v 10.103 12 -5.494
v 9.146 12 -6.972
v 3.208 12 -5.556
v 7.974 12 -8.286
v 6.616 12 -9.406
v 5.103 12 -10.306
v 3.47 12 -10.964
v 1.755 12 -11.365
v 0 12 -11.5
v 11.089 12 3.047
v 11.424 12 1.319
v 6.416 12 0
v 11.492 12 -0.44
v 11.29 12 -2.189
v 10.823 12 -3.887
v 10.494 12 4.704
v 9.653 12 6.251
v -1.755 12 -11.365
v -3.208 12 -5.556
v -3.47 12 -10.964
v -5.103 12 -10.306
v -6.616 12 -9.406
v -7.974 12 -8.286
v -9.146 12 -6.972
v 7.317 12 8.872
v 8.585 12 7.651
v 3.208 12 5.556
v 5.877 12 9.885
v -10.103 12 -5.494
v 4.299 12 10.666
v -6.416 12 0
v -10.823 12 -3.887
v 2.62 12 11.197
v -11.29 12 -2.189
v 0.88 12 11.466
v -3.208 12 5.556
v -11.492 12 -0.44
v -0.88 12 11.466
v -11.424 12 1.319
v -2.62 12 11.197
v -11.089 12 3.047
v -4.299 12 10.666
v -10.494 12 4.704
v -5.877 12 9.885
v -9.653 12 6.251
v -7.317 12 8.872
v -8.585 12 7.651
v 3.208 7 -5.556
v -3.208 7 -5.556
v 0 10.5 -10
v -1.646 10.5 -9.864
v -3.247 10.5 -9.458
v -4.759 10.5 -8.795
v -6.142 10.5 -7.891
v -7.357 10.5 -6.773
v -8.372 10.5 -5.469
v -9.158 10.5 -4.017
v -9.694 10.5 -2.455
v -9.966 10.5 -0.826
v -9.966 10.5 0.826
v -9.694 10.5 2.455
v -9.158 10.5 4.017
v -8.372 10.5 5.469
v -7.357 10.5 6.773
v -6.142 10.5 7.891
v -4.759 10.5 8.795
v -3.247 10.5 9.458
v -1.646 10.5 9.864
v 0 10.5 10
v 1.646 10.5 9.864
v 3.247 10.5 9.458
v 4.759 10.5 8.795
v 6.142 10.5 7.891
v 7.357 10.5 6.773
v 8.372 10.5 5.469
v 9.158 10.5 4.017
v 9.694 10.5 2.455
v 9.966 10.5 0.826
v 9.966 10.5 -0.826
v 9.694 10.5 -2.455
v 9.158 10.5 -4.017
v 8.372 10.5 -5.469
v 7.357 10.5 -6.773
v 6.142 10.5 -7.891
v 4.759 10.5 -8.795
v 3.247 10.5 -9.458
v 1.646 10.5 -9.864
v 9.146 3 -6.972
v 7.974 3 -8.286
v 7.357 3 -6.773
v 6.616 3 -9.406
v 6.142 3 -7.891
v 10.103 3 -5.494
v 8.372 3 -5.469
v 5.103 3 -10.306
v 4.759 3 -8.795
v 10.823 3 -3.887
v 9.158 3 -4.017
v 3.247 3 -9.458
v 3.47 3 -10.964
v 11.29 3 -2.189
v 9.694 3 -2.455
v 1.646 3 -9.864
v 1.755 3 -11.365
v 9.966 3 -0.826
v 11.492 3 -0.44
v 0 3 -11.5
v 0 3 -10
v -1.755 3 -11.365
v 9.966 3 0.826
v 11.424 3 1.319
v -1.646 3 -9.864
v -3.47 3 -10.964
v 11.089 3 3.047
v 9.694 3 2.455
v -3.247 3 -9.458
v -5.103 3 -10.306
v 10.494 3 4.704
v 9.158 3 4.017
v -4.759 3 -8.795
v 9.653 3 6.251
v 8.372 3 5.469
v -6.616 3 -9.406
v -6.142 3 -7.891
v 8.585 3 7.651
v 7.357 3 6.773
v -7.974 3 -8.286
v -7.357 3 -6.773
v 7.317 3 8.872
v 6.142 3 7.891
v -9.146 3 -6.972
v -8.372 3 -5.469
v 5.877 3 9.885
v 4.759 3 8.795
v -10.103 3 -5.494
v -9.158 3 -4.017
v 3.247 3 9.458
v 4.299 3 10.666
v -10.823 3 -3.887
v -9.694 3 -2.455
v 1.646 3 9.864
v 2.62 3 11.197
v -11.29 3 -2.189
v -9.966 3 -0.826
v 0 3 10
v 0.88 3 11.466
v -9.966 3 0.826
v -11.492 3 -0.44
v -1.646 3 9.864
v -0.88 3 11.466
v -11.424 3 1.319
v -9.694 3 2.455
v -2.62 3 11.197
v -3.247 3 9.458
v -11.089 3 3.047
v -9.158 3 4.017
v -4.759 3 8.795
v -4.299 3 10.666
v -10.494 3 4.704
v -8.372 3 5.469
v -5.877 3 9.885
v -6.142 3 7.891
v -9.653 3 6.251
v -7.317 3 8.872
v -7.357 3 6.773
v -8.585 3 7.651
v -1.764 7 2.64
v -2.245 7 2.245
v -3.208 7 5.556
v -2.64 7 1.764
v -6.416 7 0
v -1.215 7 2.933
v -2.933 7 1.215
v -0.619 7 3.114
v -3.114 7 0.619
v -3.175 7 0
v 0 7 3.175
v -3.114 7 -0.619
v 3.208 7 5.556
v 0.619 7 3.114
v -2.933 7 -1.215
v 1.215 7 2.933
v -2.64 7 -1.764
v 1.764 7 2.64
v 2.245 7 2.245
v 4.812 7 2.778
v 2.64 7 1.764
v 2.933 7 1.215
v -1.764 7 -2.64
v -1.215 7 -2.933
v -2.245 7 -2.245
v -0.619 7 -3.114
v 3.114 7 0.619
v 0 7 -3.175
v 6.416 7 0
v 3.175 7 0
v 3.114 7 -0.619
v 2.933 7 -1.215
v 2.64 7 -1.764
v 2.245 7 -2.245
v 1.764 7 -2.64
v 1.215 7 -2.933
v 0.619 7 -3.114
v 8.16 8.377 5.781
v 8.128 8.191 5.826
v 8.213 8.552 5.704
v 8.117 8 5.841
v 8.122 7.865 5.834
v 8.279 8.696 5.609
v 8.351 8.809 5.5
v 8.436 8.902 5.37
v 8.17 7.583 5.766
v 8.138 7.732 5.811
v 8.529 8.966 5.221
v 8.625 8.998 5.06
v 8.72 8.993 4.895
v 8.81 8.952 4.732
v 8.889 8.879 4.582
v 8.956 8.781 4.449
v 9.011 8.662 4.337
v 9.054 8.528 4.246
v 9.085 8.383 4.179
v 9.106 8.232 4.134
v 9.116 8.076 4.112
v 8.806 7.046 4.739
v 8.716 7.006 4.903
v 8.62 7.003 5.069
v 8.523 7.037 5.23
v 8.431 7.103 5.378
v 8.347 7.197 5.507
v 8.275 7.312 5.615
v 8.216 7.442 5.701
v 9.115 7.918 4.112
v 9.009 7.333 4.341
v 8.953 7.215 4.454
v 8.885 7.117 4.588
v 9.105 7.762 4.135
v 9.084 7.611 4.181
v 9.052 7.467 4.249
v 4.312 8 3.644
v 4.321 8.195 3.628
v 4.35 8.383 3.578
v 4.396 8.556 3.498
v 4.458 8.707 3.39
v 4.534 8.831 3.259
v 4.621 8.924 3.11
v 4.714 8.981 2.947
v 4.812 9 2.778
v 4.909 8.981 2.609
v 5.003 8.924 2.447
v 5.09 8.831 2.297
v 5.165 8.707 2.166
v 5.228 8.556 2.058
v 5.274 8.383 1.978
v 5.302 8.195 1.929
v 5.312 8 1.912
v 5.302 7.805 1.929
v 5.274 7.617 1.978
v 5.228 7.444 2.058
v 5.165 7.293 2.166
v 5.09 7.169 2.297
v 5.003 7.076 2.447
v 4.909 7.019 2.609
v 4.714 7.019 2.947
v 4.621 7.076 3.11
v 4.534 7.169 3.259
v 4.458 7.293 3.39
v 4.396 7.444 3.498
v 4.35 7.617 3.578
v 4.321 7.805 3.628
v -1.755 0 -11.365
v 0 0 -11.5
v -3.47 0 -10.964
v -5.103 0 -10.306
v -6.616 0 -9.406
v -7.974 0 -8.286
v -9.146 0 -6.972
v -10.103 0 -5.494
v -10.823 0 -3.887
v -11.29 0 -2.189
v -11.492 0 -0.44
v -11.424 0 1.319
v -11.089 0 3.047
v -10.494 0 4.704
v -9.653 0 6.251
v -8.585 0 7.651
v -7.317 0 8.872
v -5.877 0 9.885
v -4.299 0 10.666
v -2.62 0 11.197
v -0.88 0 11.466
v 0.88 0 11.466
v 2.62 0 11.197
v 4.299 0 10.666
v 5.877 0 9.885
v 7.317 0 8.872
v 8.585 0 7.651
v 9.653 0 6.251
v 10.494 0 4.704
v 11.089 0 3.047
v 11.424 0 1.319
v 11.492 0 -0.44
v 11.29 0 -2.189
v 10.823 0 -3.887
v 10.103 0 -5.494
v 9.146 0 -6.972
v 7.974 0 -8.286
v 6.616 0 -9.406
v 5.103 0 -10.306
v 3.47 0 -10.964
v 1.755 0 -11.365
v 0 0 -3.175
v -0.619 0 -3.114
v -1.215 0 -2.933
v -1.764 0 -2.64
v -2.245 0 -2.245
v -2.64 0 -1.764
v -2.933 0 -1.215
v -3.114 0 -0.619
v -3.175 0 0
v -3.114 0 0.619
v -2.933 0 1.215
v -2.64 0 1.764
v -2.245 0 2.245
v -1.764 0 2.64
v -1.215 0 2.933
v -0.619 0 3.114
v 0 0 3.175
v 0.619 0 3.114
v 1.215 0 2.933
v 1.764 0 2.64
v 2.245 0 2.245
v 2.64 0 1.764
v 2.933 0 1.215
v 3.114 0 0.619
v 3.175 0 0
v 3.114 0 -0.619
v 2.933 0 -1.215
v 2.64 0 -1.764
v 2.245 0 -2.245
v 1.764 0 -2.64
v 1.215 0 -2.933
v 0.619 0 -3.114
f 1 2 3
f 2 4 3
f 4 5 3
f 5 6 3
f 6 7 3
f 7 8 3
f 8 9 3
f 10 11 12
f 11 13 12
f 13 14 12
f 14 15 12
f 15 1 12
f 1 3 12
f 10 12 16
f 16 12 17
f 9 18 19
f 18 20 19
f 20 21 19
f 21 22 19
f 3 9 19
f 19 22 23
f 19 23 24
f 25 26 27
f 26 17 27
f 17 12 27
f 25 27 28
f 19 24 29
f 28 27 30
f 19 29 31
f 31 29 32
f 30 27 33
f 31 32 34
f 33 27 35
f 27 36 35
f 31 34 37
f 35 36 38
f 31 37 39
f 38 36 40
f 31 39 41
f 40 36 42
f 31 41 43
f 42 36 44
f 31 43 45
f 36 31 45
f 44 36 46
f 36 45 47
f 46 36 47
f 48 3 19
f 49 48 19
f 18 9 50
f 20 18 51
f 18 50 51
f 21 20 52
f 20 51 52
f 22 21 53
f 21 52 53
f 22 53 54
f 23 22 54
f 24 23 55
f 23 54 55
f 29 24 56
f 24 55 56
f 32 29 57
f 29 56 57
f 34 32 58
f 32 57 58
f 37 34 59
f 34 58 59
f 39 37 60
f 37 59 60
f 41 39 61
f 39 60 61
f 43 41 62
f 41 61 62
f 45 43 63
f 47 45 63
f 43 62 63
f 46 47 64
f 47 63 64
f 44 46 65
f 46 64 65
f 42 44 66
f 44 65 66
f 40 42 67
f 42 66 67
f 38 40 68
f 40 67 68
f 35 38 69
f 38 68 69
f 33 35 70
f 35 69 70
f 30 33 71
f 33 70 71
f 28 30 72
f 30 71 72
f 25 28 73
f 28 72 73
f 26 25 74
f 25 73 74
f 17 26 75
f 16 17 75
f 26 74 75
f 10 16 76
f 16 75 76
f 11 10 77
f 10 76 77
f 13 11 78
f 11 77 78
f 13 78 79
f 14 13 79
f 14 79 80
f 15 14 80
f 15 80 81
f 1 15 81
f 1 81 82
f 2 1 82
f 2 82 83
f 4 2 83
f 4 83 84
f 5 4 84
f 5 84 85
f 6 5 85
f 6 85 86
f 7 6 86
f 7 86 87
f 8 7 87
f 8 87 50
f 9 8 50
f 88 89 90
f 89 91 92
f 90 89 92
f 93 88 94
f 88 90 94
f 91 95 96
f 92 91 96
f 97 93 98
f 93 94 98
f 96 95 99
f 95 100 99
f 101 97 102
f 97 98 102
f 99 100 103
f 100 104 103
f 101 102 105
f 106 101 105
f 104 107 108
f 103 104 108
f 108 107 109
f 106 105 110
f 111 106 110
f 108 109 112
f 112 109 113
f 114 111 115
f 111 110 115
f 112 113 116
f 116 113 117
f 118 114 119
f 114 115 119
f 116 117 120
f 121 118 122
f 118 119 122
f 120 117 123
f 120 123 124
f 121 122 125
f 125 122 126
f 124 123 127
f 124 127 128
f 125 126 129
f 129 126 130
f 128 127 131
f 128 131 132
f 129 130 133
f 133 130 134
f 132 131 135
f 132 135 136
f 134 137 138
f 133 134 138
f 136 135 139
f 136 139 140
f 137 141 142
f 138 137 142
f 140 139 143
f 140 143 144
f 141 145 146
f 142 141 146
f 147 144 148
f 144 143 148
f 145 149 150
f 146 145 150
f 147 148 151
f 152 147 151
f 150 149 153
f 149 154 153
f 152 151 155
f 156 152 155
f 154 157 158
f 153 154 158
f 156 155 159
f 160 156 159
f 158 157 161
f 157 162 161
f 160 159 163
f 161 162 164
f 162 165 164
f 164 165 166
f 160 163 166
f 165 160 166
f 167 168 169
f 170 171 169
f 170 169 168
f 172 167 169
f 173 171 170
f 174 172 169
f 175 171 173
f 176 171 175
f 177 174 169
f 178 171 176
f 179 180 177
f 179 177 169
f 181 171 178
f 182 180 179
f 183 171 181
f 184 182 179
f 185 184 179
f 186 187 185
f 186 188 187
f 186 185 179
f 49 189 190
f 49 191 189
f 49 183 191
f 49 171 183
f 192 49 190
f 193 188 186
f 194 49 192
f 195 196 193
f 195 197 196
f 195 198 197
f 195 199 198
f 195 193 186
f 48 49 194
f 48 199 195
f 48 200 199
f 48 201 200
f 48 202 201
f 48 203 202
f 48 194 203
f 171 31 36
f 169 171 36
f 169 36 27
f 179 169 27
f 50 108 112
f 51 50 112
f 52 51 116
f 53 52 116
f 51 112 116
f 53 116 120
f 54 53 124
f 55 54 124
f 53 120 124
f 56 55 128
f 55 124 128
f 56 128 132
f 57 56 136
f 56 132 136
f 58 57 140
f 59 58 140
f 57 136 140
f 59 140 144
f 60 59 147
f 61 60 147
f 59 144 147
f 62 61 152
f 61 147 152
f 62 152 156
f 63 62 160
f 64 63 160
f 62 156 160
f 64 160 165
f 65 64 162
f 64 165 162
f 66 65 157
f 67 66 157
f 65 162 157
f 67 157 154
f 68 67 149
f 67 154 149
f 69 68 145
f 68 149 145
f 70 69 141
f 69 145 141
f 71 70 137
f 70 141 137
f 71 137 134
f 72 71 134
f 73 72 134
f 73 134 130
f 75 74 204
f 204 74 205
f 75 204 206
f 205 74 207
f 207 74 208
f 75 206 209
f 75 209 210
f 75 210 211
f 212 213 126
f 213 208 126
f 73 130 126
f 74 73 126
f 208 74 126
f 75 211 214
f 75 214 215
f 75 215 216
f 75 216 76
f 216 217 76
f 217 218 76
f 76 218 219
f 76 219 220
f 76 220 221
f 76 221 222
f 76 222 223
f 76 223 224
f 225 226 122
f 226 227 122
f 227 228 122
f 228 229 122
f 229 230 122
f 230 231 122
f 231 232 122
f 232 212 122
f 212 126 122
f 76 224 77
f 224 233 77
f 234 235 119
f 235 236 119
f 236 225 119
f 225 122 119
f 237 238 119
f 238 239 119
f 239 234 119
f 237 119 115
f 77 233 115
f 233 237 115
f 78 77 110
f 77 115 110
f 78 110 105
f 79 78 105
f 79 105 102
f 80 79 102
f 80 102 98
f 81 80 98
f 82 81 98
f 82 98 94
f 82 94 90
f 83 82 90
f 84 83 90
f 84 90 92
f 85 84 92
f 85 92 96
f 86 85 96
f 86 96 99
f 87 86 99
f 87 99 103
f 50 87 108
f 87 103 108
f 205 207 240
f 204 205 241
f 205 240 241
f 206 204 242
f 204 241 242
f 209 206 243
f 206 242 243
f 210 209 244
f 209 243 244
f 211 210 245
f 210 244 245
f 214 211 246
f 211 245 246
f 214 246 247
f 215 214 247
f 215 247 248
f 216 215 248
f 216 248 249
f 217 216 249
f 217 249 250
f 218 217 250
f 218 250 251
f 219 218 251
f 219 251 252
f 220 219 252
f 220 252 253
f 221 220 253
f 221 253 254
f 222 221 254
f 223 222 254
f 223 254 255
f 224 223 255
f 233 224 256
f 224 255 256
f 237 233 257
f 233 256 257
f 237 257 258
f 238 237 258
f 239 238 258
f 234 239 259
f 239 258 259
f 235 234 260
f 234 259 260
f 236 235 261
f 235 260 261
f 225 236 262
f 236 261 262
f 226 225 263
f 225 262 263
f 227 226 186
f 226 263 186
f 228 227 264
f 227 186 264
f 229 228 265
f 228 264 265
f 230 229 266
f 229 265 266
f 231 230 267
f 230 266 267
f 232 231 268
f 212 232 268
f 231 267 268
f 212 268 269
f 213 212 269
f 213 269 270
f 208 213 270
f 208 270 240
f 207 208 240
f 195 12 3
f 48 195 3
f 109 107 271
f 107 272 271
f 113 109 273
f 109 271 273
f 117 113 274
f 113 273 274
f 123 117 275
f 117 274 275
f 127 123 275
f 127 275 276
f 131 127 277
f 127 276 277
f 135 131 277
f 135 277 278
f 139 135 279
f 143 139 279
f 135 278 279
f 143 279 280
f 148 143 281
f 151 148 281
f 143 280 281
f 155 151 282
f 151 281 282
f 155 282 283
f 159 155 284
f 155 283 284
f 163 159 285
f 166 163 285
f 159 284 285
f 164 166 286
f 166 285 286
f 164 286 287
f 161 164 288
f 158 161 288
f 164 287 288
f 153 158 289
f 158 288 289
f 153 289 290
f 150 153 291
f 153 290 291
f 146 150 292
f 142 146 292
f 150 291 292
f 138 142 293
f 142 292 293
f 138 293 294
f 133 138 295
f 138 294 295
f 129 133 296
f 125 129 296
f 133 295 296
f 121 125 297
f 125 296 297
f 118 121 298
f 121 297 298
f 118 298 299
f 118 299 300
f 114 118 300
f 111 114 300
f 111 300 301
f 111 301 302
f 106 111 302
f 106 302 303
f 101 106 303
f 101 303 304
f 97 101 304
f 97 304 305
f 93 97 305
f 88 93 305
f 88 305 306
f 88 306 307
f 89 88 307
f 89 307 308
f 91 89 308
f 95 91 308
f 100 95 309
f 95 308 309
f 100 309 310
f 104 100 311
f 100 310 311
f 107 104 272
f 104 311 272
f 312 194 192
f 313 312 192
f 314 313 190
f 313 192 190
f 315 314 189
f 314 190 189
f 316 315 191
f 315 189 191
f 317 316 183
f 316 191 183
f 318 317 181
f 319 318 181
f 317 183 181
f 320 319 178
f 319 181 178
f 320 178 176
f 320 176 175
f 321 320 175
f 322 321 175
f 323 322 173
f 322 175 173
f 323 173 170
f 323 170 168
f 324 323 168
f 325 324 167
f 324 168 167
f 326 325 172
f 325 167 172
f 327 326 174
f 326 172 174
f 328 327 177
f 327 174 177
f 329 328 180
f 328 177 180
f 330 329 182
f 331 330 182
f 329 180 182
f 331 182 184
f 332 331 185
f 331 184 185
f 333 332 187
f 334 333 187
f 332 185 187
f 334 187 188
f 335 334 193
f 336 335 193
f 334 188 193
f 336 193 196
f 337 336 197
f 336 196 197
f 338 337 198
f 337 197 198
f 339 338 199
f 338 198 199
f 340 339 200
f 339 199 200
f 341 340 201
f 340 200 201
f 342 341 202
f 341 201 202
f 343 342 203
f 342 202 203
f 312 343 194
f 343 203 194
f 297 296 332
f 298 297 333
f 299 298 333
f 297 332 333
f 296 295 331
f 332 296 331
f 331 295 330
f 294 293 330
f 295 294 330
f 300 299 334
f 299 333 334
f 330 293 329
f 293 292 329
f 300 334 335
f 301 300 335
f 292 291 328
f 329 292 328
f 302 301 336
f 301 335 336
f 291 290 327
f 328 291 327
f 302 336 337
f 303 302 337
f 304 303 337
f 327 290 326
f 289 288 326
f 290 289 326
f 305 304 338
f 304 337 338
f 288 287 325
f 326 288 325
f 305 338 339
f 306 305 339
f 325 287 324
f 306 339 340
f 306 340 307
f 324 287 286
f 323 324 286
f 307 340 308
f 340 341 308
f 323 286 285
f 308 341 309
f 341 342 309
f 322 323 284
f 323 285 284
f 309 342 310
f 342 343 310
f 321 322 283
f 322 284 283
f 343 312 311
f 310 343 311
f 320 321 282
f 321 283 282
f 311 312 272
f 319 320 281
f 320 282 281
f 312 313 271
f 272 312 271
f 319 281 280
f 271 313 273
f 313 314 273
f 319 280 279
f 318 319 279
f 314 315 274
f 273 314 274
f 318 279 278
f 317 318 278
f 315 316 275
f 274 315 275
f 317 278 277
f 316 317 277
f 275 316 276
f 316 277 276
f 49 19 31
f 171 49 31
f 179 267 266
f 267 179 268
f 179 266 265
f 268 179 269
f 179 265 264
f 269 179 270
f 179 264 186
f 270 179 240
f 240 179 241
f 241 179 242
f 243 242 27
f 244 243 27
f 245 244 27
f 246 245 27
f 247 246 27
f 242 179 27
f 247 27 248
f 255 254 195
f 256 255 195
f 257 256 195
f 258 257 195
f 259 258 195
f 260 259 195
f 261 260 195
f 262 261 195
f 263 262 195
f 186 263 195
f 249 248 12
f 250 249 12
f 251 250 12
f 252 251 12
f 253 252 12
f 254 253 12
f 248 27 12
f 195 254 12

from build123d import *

# Parameters (mm, degrees)
CUT_EXTRUDE1_DEPTH = 5
SKETCH5_R          = 1
CUT_EXTRUDE3_DEPTH = 25.777841371


with BuildPart() as part:
    # Sketch1 → Revolve1 (revolve)
    with BuildSketch(Plane.XY, mode=Mode.PRIVATE) as revolve1_sk:
        Polygon((3.175, 0), (3.175, 12), (11.5, 12), (10, 10.5), (10, 3), (11.5, 3), (11.5, 0), align=None)
    revolve(revolve1_sk.sketch.rotate(Axis((0, 0, 0), (0, 1, 0)), 90), axis=Axis((0, 0, 0), (0, 1, 0)))

    # Sketch2 → Cut-Extrude1 (cut)
    with BuildSketch(Plane(origin=(0, 12, 0), x_dir=(1, 0, 0), z_dir=(0, 1, 0))):
        Polygon((3.207902433, 5.55625), (-3.207902433, 5.55625), (-6.415804866, 0), (-3.207902433, -5.55625), (3.207902433, -5.55625), (6.415804866, 0), align=None)
    extrude(amount=-CUT_EXTRUDE1_DEPTH, mode=Mode.SUBTRACT)

    # Sketch5 → Cut-Extrude3 (cut, through all)
    with BuildSketch(Plane(origin=(4.81185365, 0, 2.778125), x_dir=(-0.5000000000000006, 0, 0.8660254037844384), z_dir=(-0.8660254037844384, 0, -0.5000000000000006))):
        with Locations((0, 8)):
            Circle(SKETCH5_R)
    extrude(amount=-CUT_EXTRUDE3_DEPTH, mode=Mode.SUBTRACT)


solid = part.part
